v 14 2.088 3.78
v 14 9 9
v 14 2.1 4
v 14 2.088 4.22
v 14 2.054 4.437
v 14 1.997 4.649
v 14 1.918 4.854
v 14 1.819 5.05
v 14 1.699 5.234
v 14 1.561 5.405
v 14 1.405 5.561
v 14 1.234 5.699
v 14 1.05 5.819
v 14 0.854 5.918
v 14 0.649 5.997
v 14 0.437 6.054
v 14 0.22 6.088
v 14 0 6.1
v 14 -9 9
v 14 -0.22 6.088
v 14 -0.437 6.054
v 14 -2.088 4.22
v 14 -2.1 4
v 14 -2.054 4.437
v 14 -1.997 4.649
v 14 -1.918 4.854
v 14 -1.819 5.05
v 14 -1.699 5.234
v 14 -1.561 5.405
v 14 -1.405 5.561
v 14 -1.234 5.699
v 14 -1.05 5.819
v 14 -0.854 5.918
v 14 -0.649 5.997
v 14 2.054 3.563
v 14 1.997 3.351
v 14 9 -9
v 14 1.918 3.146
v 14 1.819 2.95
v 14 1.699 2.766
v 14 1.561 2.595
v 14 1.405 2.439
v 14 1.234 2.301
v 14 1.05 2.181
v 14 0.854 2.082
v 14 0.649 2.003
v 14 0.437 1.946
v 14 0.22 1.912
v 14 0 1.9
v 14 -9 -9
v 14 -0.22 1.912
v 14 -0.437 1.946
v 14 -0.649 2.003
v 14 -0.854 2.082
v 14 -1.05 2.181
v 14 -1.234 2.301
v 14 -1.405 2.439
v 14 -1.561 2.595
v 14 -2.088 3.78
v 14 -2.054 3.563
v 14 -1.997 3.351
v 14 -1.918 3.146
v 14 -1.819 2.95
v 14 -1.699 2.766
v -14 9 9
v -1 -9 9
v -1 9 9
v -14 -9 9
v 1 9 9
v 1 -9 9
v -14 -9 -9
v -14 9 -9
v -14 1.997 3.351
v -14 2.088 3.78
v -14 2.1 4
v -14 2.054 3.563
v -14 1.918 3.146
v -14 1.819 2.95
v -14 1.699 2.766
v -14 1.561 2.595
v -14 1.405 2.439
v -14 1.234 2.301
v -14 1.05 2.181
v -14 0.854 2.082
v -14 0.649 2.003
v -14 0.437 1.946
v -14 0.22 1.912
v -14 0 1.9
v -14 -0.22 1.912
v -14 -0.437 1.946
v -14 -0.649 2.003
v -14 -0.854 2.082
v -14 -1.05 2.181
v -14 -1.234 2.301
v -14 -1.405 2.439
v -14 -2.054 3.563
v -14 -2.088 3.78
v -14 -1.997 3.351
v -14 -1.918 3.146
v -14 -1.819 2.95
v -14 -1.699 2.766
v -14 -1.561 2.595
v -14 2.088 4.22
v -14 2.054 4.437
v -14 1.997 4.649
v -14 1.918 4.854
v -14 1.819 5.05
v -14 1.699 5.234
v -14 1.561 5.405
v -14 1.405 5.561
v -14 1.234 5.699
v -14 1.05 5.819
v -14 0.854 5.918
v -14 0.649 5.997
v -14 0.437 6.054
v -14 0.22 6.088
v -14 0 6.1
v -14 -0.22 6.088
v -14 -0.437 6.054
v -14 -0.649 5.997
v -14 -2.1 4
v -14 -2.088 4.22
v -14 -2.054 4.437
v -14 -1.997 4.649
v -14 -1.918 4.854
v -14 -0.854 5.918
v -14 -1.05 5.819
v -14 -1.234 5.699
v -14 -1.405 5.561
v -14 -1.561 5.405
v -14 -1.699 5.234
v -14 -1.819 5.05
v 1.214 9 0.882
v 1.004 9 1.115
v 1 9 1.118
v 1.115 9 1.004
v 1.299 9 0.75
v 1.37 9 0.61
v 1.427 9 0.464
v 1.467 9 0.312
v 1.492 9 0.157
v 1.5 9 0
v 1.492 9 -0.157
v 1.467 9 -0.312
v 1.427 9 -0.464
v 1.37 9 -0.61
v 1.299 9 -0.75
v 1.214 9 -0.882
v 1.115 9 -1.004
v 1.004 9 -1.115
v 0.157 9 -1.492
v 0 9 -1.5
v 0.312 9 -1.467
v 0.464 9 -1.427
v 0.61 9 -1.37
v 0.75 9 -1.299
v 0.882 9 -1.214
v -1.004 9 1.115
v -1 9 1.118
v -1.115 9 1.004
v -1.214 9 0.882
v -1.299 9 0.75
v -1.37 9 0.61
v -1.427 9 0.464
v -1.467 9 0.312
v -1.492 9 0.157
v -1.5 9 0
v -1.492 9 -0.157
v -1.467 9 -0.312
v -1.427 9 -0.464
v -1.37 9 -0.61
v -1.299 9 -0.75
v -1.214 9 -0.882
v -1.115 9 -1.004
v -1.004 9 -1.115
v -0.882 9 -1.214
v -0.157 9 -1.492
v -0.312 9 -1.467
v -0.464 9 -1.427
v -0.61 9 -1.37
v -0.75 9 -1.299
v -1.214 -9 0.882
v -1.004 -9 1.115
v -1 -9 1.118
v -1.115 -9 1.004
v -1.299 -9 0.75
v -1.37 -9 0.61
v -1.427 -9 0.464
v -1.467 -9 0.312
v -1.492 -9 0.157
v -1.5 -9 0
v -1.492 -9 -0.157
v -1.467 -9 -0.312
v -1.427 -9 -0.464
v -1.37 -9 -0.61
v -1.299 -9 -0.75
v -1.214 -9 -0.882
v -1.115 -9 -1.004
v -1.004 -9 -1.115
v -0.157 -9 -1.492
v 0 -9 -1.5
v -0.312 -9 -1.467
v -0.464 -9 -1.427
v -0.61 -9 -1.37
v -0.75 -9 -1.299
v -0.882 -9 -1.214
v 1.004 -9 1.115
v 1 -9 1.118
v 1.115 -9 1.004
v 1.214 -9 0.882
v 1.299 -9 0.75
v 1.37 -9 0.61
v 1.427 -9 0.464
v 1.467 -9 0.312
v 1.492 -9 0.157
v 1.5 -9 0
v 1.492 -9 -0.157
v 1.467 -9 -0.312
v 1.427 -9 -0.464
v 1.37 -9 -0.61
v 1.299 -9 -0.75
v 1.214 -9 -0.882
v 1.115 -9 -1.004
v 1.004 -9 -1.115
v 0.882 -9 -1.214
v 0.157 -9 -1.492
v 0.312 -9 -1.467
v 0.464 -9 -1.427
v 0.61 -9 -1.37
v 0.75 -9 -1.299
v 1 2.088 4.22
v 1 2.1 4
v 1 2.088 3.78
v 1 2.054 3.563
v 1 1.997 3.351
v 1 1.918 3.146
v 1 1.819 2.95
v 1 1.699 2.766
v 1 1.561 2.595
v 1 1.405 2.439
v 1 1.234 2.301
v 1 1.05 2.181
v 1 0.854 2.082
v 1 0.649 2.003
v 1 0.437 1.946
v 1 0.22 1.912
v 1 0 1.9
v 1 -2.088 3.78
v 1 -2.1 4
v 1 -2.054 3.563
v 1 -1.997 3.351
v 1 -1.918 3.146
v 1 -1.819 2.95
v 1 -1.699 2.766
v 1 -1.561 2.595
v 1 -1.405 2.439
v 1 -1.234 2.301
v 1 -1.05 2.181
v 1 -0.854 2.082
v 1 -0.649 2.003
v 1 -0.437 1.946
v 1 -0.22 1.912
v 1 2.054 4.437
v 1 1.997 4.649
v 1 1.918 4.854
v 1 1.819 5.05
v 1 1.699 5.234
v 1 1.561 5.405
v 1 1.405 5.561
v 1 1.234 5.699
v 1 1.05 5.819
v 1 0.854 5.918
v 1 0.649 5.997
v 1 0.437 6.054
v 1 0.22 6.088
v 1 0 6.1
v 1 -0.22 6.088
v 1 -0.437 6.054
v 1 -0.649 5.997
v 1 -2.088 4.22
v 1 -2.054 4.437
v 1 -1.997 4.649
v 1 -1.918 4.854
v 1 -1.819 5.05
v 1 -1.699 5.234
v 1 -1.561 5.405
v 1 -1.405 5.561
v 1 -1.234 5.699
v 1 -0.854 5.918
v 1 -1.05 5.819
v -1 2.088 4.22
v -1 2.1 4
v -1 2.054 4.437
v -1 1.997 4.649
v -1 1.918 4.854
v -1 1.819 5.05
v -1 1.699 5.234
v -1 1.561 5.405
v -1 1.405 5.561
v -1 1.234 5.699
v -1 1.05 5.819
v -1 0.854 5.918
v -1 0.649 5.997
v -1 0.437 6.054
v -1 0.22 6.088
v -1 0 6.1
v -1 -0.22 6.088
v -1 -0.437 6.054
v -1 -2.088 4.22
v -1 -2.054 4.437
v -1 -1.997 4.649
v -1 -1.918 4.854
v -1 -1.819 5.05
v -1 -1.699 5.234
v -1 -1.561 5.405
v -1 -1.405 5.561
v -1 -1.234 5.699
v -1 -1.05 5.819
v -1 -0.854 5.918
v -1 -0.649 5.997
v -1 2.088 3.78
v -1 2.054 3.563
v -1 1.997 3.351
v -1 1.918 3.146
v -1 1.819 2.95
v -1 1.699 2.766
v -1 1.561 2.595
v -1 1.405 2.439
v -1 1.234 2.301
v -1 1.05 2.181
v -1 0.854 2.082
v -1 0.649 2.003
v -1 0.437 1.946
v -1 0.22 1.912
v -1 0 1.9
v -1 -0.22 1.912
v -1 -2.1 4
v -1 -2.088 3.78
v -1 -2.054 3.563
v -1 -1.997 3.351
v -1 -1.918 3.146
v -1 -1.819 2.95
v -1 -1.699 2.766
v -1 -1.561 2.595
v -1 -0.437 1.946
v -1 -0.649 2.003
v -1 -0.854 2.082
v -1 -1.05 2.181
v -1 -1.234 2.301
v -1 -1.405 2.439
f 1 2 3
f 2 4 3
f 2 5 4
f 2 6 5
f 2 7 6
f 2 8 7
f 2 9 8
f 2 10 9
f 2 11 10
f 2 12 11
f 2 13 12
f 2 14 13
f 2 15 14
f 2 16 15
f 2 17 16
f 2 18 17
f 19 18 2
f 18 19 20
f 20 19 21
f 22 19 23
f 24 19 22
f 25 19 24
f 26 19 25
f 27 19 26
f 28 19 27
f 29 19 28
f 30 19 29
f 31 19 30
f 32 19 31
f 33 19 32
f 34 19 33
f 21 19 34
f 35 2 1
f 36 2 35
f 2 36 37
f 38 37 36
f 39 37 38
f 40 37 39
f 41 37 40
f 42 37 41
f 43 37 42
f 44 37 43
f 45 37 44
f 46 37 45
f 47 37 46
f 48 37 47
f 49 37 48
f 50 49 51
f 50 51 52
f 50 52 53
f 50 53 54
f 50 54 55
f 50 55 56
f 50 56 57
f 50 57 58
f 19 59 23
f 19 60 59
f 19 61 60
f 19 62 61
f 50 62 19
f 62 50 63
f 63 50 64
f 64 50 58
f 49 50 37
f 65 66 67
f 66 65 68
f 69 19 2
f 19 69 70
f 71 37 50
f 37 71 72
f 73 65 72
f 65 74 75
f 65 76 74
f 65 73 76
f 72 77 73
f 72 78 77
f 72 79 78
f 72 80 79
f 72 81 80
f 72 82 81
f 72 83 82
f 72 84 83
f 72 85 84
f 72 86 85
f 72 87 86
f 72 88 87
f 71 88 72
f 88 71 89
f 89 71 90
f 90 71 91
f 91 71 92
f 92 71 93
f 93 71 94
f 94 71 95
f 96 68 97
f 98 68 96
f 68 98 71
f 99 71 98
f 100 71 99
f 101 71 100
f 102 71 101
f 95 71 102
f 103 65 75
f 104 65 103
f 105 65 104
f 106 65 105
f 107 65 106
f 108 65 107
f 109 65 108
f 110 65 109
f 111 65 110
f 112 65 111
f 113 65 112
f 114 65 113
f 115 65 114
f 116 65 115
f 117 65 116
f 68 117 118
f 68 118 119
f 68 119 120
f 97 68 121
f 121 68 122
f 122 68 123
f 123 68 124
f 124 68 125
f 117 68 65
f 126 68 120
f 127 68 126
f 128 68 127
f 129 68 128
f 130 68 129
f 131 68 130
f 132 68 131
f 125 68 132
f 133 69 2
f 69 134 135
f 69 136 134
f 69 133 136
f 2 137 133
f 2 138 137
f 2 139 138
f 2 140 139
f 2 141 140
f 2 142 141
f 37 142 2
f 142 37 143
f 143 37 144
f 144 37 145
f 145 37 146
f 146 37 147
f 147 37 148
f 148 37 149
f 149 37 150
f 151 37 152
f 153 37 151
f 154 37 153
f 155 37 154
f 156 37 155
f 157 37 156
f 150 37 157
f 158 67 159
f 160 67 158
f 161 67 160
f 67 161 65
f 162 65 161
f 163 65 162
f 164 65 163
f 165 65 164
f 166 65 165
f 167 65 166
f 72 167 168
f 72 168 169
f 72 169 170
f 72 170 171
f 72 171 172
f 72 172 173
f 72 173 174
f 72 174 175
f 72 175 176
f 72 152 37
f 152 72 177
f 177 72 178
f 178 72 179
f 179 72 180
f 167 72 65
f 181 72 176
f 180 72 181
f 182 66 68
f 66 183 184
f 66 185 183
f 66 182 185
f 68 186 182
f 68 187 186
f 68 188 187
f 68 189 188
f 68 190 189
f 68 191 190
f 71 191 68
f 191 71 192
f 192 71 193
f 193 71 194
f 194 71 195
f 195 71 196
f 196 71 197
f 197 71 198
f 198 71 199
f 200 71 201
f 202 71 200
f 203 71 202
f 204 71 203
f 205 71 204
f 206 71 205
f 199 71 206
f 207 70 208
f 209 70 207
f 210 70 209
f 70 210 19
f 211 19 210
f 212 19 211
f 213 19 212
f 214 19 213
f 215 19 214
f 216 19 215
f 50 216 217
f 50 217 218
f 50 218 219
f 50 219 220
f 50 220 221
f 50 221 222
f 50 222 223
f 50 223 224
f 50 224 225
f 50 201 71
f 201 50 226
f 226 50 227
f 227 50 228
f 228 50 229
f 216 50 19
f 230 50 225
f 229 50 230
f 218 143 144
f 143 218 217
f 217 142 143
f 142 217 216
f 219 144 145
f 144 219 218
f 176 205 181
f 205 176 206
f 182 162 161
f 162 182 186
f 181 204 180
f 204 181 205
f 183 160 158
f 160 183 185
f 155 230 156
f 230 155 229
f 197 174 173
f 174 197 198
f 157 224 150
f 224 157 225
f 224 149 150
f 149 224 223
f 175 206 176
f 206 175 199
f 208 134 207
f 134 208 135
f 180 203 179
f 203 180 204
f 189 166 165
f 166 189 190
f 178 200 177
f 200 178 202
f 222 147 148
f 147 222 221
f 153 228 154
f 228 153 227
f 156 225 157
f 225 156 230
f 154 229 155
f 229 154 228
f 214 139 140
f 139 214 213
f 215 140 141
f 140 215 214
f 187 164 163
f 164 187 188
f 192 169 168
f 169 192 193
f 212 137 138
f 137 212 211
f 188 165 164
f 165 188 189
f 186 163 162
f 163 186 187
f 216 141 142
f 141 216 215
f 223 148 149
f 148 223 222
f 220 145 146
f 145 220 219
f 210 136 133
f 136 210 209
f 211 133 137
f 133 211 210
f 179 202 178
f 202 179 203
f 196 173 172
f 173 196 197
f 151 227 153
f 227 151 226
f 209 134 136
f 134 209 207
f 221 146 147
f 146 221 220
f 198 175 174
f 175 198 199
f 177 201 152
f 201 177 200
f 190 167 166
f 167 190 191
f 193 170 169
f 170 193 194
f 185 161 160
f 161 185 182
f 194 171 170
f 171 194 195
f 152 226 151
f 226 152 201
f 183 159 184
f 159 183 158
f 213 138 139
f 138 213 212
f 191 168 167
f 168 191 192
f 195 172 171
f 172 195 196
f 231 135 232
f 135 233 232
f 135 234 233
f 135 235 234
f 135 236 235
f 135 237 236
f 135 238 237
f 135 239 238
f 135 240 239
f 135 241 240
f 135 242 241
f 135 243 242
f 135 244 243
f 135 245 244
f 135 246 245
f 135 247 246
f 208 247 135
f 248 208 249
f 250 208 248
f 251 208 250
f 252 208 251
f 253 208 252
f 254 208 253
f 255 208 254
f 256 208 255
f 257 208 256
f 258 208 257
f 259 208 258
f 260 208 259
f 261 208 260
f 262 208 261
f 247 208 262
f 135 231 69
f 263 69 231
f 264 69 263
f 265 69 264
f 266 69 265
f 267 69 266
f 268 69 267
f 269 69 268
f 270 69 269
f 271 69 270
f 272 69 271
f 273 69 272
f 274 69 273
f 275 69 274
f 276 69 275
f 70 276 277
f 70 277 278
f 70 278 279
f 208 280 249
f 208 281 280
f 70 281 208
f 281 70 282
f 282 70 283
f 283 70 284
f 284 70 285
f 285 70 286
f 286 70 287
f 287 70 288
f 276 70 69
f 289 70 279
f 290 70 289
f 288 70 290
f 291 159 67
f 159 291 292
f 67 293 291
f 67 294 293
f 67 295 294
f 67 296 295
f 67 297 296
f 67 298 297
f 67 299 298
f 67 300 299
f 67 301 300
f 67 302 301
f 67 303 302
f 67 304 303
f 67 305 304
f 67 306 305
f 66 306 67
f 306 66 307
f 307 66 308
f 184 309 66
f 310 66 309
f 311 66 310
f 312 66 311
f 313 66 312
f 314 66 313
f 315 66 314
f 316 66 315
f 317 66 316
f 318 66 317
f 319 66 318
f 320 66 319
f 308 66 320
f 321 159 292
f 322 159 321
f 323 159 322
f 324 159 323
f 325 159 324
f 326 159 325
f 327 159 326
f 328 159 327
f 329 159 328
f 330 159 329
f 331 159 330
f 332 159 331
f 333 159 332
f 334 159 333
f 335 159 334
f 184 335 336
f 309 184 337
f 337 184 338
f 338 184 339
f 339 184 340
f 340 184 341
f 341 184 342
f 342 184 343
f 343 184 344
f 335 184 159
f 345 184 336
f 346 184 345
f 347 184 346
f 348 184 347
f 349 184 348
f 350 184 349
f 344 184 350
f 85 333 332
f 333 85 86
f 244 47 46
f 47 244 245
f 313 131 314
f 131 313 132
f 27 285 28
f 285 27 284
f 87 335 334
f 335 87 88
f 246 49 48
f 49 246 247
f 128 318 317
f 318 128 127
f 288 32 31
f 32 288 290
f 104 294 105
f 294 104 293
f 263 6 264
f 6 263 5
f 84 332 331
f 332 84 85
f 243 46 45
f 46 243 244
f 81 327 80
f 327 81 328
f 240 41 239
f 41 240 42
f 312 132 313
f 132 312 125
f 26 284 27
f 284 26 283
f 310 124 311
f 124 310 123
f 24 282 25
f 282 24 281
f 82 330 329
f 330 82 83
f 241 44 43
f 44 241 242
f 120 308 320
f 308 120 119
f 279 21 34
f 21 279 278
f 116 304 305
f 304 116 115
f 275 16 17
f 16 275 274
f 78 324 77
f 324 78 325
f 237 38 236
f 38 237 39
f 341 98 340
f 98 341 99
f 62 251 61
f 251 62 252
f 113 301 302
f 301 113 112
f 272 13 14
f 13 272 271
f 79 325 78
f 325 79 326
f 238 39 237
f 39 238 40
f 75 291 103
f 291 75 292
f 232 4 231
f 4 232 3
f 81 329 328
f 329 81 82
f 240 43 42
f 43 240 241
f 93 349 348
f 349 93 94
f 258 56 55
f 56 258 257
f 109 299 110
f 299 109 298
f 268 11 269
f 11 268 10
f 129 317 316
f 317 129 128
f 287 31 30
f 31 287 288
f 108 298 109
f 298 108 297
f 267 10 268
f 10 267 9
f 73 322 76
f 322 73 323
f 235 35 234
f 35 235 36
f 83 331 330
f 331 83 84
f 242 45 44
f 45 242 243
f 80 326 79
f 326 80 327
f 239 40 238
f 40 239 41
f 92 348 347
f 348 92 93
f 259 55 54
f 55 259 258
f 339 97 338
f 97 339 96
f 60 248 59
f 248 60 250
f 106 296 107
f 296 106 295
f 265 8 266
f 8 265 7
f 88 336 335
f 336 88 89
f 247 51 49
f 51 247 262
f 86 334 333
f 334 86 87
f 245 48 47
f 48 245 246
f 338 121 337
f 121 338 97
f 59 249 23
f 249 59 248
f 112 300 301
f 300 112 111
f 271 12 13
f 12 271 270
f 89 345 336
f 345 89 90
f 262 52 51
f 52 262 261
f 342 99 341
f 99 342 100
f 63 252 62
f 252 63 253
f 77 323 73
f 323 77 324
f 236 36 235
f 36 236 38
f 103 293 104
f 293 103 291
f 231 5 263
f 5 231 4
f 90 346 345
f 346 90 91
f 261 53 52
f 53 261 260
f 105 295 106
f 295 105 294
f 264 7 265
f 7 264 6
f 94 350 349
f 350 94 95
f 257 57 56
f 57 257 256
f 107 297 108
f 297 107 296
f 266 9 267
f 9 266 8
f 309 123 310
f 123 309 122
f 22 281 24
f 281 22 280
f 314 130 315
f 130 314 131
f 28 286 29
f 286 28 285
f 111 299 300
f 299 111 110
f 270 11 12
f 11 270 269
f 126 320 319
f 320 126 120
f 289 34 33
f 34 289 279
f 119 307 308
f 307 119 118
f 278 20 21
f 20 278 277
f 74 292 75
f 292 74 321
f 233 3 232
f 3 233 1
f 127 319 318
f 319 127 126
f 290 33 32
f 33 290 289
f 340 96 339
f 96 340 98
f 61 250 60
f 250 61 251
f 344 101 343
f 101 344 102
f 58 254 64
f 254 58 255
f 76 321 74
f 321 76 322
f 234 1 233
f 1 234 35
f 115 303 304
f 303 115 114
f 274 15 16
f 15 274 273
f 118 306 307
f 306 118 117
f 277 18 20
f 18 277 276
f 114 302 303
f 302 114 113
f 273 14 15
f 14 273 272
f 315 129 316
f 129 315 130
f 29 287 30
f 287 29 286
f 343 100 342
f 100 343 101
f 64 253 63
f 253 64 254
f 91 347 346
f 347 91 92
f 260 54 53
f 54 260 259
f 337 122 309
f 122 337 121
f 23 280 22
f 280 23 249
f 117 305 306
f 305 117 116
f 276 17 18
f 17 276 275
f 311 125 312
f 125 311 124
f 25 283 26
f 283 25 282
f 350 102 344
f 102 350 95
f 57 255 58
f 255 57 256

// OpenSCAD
// Split clamp block.
$fn = 60;
eps = 0.02;
bore_d = 3;
body_w = 18;
body_h = 18;
body_l = 28;
slot_w = 2;
difference() {
    cube([body_l, body_w, body_h], center = true);
    translate([0, -body_w / 2 - eps, 0]) rotate([-90,0,0]) cylinder(d = bore_d, h = body_w + 2 * eps);
    translate([-slot_w / 2, -body_w / 2 - eps, 0]) cube([slot_w, body_w + 2 * eps, body_h / 2 + eps]);
    translate([-body_l / 2 - eps, 0, body_h / 2 - 5]) rotate([0,90,0]) cylinder(d = 4.2, h = body_l + 2 * eps);
}
